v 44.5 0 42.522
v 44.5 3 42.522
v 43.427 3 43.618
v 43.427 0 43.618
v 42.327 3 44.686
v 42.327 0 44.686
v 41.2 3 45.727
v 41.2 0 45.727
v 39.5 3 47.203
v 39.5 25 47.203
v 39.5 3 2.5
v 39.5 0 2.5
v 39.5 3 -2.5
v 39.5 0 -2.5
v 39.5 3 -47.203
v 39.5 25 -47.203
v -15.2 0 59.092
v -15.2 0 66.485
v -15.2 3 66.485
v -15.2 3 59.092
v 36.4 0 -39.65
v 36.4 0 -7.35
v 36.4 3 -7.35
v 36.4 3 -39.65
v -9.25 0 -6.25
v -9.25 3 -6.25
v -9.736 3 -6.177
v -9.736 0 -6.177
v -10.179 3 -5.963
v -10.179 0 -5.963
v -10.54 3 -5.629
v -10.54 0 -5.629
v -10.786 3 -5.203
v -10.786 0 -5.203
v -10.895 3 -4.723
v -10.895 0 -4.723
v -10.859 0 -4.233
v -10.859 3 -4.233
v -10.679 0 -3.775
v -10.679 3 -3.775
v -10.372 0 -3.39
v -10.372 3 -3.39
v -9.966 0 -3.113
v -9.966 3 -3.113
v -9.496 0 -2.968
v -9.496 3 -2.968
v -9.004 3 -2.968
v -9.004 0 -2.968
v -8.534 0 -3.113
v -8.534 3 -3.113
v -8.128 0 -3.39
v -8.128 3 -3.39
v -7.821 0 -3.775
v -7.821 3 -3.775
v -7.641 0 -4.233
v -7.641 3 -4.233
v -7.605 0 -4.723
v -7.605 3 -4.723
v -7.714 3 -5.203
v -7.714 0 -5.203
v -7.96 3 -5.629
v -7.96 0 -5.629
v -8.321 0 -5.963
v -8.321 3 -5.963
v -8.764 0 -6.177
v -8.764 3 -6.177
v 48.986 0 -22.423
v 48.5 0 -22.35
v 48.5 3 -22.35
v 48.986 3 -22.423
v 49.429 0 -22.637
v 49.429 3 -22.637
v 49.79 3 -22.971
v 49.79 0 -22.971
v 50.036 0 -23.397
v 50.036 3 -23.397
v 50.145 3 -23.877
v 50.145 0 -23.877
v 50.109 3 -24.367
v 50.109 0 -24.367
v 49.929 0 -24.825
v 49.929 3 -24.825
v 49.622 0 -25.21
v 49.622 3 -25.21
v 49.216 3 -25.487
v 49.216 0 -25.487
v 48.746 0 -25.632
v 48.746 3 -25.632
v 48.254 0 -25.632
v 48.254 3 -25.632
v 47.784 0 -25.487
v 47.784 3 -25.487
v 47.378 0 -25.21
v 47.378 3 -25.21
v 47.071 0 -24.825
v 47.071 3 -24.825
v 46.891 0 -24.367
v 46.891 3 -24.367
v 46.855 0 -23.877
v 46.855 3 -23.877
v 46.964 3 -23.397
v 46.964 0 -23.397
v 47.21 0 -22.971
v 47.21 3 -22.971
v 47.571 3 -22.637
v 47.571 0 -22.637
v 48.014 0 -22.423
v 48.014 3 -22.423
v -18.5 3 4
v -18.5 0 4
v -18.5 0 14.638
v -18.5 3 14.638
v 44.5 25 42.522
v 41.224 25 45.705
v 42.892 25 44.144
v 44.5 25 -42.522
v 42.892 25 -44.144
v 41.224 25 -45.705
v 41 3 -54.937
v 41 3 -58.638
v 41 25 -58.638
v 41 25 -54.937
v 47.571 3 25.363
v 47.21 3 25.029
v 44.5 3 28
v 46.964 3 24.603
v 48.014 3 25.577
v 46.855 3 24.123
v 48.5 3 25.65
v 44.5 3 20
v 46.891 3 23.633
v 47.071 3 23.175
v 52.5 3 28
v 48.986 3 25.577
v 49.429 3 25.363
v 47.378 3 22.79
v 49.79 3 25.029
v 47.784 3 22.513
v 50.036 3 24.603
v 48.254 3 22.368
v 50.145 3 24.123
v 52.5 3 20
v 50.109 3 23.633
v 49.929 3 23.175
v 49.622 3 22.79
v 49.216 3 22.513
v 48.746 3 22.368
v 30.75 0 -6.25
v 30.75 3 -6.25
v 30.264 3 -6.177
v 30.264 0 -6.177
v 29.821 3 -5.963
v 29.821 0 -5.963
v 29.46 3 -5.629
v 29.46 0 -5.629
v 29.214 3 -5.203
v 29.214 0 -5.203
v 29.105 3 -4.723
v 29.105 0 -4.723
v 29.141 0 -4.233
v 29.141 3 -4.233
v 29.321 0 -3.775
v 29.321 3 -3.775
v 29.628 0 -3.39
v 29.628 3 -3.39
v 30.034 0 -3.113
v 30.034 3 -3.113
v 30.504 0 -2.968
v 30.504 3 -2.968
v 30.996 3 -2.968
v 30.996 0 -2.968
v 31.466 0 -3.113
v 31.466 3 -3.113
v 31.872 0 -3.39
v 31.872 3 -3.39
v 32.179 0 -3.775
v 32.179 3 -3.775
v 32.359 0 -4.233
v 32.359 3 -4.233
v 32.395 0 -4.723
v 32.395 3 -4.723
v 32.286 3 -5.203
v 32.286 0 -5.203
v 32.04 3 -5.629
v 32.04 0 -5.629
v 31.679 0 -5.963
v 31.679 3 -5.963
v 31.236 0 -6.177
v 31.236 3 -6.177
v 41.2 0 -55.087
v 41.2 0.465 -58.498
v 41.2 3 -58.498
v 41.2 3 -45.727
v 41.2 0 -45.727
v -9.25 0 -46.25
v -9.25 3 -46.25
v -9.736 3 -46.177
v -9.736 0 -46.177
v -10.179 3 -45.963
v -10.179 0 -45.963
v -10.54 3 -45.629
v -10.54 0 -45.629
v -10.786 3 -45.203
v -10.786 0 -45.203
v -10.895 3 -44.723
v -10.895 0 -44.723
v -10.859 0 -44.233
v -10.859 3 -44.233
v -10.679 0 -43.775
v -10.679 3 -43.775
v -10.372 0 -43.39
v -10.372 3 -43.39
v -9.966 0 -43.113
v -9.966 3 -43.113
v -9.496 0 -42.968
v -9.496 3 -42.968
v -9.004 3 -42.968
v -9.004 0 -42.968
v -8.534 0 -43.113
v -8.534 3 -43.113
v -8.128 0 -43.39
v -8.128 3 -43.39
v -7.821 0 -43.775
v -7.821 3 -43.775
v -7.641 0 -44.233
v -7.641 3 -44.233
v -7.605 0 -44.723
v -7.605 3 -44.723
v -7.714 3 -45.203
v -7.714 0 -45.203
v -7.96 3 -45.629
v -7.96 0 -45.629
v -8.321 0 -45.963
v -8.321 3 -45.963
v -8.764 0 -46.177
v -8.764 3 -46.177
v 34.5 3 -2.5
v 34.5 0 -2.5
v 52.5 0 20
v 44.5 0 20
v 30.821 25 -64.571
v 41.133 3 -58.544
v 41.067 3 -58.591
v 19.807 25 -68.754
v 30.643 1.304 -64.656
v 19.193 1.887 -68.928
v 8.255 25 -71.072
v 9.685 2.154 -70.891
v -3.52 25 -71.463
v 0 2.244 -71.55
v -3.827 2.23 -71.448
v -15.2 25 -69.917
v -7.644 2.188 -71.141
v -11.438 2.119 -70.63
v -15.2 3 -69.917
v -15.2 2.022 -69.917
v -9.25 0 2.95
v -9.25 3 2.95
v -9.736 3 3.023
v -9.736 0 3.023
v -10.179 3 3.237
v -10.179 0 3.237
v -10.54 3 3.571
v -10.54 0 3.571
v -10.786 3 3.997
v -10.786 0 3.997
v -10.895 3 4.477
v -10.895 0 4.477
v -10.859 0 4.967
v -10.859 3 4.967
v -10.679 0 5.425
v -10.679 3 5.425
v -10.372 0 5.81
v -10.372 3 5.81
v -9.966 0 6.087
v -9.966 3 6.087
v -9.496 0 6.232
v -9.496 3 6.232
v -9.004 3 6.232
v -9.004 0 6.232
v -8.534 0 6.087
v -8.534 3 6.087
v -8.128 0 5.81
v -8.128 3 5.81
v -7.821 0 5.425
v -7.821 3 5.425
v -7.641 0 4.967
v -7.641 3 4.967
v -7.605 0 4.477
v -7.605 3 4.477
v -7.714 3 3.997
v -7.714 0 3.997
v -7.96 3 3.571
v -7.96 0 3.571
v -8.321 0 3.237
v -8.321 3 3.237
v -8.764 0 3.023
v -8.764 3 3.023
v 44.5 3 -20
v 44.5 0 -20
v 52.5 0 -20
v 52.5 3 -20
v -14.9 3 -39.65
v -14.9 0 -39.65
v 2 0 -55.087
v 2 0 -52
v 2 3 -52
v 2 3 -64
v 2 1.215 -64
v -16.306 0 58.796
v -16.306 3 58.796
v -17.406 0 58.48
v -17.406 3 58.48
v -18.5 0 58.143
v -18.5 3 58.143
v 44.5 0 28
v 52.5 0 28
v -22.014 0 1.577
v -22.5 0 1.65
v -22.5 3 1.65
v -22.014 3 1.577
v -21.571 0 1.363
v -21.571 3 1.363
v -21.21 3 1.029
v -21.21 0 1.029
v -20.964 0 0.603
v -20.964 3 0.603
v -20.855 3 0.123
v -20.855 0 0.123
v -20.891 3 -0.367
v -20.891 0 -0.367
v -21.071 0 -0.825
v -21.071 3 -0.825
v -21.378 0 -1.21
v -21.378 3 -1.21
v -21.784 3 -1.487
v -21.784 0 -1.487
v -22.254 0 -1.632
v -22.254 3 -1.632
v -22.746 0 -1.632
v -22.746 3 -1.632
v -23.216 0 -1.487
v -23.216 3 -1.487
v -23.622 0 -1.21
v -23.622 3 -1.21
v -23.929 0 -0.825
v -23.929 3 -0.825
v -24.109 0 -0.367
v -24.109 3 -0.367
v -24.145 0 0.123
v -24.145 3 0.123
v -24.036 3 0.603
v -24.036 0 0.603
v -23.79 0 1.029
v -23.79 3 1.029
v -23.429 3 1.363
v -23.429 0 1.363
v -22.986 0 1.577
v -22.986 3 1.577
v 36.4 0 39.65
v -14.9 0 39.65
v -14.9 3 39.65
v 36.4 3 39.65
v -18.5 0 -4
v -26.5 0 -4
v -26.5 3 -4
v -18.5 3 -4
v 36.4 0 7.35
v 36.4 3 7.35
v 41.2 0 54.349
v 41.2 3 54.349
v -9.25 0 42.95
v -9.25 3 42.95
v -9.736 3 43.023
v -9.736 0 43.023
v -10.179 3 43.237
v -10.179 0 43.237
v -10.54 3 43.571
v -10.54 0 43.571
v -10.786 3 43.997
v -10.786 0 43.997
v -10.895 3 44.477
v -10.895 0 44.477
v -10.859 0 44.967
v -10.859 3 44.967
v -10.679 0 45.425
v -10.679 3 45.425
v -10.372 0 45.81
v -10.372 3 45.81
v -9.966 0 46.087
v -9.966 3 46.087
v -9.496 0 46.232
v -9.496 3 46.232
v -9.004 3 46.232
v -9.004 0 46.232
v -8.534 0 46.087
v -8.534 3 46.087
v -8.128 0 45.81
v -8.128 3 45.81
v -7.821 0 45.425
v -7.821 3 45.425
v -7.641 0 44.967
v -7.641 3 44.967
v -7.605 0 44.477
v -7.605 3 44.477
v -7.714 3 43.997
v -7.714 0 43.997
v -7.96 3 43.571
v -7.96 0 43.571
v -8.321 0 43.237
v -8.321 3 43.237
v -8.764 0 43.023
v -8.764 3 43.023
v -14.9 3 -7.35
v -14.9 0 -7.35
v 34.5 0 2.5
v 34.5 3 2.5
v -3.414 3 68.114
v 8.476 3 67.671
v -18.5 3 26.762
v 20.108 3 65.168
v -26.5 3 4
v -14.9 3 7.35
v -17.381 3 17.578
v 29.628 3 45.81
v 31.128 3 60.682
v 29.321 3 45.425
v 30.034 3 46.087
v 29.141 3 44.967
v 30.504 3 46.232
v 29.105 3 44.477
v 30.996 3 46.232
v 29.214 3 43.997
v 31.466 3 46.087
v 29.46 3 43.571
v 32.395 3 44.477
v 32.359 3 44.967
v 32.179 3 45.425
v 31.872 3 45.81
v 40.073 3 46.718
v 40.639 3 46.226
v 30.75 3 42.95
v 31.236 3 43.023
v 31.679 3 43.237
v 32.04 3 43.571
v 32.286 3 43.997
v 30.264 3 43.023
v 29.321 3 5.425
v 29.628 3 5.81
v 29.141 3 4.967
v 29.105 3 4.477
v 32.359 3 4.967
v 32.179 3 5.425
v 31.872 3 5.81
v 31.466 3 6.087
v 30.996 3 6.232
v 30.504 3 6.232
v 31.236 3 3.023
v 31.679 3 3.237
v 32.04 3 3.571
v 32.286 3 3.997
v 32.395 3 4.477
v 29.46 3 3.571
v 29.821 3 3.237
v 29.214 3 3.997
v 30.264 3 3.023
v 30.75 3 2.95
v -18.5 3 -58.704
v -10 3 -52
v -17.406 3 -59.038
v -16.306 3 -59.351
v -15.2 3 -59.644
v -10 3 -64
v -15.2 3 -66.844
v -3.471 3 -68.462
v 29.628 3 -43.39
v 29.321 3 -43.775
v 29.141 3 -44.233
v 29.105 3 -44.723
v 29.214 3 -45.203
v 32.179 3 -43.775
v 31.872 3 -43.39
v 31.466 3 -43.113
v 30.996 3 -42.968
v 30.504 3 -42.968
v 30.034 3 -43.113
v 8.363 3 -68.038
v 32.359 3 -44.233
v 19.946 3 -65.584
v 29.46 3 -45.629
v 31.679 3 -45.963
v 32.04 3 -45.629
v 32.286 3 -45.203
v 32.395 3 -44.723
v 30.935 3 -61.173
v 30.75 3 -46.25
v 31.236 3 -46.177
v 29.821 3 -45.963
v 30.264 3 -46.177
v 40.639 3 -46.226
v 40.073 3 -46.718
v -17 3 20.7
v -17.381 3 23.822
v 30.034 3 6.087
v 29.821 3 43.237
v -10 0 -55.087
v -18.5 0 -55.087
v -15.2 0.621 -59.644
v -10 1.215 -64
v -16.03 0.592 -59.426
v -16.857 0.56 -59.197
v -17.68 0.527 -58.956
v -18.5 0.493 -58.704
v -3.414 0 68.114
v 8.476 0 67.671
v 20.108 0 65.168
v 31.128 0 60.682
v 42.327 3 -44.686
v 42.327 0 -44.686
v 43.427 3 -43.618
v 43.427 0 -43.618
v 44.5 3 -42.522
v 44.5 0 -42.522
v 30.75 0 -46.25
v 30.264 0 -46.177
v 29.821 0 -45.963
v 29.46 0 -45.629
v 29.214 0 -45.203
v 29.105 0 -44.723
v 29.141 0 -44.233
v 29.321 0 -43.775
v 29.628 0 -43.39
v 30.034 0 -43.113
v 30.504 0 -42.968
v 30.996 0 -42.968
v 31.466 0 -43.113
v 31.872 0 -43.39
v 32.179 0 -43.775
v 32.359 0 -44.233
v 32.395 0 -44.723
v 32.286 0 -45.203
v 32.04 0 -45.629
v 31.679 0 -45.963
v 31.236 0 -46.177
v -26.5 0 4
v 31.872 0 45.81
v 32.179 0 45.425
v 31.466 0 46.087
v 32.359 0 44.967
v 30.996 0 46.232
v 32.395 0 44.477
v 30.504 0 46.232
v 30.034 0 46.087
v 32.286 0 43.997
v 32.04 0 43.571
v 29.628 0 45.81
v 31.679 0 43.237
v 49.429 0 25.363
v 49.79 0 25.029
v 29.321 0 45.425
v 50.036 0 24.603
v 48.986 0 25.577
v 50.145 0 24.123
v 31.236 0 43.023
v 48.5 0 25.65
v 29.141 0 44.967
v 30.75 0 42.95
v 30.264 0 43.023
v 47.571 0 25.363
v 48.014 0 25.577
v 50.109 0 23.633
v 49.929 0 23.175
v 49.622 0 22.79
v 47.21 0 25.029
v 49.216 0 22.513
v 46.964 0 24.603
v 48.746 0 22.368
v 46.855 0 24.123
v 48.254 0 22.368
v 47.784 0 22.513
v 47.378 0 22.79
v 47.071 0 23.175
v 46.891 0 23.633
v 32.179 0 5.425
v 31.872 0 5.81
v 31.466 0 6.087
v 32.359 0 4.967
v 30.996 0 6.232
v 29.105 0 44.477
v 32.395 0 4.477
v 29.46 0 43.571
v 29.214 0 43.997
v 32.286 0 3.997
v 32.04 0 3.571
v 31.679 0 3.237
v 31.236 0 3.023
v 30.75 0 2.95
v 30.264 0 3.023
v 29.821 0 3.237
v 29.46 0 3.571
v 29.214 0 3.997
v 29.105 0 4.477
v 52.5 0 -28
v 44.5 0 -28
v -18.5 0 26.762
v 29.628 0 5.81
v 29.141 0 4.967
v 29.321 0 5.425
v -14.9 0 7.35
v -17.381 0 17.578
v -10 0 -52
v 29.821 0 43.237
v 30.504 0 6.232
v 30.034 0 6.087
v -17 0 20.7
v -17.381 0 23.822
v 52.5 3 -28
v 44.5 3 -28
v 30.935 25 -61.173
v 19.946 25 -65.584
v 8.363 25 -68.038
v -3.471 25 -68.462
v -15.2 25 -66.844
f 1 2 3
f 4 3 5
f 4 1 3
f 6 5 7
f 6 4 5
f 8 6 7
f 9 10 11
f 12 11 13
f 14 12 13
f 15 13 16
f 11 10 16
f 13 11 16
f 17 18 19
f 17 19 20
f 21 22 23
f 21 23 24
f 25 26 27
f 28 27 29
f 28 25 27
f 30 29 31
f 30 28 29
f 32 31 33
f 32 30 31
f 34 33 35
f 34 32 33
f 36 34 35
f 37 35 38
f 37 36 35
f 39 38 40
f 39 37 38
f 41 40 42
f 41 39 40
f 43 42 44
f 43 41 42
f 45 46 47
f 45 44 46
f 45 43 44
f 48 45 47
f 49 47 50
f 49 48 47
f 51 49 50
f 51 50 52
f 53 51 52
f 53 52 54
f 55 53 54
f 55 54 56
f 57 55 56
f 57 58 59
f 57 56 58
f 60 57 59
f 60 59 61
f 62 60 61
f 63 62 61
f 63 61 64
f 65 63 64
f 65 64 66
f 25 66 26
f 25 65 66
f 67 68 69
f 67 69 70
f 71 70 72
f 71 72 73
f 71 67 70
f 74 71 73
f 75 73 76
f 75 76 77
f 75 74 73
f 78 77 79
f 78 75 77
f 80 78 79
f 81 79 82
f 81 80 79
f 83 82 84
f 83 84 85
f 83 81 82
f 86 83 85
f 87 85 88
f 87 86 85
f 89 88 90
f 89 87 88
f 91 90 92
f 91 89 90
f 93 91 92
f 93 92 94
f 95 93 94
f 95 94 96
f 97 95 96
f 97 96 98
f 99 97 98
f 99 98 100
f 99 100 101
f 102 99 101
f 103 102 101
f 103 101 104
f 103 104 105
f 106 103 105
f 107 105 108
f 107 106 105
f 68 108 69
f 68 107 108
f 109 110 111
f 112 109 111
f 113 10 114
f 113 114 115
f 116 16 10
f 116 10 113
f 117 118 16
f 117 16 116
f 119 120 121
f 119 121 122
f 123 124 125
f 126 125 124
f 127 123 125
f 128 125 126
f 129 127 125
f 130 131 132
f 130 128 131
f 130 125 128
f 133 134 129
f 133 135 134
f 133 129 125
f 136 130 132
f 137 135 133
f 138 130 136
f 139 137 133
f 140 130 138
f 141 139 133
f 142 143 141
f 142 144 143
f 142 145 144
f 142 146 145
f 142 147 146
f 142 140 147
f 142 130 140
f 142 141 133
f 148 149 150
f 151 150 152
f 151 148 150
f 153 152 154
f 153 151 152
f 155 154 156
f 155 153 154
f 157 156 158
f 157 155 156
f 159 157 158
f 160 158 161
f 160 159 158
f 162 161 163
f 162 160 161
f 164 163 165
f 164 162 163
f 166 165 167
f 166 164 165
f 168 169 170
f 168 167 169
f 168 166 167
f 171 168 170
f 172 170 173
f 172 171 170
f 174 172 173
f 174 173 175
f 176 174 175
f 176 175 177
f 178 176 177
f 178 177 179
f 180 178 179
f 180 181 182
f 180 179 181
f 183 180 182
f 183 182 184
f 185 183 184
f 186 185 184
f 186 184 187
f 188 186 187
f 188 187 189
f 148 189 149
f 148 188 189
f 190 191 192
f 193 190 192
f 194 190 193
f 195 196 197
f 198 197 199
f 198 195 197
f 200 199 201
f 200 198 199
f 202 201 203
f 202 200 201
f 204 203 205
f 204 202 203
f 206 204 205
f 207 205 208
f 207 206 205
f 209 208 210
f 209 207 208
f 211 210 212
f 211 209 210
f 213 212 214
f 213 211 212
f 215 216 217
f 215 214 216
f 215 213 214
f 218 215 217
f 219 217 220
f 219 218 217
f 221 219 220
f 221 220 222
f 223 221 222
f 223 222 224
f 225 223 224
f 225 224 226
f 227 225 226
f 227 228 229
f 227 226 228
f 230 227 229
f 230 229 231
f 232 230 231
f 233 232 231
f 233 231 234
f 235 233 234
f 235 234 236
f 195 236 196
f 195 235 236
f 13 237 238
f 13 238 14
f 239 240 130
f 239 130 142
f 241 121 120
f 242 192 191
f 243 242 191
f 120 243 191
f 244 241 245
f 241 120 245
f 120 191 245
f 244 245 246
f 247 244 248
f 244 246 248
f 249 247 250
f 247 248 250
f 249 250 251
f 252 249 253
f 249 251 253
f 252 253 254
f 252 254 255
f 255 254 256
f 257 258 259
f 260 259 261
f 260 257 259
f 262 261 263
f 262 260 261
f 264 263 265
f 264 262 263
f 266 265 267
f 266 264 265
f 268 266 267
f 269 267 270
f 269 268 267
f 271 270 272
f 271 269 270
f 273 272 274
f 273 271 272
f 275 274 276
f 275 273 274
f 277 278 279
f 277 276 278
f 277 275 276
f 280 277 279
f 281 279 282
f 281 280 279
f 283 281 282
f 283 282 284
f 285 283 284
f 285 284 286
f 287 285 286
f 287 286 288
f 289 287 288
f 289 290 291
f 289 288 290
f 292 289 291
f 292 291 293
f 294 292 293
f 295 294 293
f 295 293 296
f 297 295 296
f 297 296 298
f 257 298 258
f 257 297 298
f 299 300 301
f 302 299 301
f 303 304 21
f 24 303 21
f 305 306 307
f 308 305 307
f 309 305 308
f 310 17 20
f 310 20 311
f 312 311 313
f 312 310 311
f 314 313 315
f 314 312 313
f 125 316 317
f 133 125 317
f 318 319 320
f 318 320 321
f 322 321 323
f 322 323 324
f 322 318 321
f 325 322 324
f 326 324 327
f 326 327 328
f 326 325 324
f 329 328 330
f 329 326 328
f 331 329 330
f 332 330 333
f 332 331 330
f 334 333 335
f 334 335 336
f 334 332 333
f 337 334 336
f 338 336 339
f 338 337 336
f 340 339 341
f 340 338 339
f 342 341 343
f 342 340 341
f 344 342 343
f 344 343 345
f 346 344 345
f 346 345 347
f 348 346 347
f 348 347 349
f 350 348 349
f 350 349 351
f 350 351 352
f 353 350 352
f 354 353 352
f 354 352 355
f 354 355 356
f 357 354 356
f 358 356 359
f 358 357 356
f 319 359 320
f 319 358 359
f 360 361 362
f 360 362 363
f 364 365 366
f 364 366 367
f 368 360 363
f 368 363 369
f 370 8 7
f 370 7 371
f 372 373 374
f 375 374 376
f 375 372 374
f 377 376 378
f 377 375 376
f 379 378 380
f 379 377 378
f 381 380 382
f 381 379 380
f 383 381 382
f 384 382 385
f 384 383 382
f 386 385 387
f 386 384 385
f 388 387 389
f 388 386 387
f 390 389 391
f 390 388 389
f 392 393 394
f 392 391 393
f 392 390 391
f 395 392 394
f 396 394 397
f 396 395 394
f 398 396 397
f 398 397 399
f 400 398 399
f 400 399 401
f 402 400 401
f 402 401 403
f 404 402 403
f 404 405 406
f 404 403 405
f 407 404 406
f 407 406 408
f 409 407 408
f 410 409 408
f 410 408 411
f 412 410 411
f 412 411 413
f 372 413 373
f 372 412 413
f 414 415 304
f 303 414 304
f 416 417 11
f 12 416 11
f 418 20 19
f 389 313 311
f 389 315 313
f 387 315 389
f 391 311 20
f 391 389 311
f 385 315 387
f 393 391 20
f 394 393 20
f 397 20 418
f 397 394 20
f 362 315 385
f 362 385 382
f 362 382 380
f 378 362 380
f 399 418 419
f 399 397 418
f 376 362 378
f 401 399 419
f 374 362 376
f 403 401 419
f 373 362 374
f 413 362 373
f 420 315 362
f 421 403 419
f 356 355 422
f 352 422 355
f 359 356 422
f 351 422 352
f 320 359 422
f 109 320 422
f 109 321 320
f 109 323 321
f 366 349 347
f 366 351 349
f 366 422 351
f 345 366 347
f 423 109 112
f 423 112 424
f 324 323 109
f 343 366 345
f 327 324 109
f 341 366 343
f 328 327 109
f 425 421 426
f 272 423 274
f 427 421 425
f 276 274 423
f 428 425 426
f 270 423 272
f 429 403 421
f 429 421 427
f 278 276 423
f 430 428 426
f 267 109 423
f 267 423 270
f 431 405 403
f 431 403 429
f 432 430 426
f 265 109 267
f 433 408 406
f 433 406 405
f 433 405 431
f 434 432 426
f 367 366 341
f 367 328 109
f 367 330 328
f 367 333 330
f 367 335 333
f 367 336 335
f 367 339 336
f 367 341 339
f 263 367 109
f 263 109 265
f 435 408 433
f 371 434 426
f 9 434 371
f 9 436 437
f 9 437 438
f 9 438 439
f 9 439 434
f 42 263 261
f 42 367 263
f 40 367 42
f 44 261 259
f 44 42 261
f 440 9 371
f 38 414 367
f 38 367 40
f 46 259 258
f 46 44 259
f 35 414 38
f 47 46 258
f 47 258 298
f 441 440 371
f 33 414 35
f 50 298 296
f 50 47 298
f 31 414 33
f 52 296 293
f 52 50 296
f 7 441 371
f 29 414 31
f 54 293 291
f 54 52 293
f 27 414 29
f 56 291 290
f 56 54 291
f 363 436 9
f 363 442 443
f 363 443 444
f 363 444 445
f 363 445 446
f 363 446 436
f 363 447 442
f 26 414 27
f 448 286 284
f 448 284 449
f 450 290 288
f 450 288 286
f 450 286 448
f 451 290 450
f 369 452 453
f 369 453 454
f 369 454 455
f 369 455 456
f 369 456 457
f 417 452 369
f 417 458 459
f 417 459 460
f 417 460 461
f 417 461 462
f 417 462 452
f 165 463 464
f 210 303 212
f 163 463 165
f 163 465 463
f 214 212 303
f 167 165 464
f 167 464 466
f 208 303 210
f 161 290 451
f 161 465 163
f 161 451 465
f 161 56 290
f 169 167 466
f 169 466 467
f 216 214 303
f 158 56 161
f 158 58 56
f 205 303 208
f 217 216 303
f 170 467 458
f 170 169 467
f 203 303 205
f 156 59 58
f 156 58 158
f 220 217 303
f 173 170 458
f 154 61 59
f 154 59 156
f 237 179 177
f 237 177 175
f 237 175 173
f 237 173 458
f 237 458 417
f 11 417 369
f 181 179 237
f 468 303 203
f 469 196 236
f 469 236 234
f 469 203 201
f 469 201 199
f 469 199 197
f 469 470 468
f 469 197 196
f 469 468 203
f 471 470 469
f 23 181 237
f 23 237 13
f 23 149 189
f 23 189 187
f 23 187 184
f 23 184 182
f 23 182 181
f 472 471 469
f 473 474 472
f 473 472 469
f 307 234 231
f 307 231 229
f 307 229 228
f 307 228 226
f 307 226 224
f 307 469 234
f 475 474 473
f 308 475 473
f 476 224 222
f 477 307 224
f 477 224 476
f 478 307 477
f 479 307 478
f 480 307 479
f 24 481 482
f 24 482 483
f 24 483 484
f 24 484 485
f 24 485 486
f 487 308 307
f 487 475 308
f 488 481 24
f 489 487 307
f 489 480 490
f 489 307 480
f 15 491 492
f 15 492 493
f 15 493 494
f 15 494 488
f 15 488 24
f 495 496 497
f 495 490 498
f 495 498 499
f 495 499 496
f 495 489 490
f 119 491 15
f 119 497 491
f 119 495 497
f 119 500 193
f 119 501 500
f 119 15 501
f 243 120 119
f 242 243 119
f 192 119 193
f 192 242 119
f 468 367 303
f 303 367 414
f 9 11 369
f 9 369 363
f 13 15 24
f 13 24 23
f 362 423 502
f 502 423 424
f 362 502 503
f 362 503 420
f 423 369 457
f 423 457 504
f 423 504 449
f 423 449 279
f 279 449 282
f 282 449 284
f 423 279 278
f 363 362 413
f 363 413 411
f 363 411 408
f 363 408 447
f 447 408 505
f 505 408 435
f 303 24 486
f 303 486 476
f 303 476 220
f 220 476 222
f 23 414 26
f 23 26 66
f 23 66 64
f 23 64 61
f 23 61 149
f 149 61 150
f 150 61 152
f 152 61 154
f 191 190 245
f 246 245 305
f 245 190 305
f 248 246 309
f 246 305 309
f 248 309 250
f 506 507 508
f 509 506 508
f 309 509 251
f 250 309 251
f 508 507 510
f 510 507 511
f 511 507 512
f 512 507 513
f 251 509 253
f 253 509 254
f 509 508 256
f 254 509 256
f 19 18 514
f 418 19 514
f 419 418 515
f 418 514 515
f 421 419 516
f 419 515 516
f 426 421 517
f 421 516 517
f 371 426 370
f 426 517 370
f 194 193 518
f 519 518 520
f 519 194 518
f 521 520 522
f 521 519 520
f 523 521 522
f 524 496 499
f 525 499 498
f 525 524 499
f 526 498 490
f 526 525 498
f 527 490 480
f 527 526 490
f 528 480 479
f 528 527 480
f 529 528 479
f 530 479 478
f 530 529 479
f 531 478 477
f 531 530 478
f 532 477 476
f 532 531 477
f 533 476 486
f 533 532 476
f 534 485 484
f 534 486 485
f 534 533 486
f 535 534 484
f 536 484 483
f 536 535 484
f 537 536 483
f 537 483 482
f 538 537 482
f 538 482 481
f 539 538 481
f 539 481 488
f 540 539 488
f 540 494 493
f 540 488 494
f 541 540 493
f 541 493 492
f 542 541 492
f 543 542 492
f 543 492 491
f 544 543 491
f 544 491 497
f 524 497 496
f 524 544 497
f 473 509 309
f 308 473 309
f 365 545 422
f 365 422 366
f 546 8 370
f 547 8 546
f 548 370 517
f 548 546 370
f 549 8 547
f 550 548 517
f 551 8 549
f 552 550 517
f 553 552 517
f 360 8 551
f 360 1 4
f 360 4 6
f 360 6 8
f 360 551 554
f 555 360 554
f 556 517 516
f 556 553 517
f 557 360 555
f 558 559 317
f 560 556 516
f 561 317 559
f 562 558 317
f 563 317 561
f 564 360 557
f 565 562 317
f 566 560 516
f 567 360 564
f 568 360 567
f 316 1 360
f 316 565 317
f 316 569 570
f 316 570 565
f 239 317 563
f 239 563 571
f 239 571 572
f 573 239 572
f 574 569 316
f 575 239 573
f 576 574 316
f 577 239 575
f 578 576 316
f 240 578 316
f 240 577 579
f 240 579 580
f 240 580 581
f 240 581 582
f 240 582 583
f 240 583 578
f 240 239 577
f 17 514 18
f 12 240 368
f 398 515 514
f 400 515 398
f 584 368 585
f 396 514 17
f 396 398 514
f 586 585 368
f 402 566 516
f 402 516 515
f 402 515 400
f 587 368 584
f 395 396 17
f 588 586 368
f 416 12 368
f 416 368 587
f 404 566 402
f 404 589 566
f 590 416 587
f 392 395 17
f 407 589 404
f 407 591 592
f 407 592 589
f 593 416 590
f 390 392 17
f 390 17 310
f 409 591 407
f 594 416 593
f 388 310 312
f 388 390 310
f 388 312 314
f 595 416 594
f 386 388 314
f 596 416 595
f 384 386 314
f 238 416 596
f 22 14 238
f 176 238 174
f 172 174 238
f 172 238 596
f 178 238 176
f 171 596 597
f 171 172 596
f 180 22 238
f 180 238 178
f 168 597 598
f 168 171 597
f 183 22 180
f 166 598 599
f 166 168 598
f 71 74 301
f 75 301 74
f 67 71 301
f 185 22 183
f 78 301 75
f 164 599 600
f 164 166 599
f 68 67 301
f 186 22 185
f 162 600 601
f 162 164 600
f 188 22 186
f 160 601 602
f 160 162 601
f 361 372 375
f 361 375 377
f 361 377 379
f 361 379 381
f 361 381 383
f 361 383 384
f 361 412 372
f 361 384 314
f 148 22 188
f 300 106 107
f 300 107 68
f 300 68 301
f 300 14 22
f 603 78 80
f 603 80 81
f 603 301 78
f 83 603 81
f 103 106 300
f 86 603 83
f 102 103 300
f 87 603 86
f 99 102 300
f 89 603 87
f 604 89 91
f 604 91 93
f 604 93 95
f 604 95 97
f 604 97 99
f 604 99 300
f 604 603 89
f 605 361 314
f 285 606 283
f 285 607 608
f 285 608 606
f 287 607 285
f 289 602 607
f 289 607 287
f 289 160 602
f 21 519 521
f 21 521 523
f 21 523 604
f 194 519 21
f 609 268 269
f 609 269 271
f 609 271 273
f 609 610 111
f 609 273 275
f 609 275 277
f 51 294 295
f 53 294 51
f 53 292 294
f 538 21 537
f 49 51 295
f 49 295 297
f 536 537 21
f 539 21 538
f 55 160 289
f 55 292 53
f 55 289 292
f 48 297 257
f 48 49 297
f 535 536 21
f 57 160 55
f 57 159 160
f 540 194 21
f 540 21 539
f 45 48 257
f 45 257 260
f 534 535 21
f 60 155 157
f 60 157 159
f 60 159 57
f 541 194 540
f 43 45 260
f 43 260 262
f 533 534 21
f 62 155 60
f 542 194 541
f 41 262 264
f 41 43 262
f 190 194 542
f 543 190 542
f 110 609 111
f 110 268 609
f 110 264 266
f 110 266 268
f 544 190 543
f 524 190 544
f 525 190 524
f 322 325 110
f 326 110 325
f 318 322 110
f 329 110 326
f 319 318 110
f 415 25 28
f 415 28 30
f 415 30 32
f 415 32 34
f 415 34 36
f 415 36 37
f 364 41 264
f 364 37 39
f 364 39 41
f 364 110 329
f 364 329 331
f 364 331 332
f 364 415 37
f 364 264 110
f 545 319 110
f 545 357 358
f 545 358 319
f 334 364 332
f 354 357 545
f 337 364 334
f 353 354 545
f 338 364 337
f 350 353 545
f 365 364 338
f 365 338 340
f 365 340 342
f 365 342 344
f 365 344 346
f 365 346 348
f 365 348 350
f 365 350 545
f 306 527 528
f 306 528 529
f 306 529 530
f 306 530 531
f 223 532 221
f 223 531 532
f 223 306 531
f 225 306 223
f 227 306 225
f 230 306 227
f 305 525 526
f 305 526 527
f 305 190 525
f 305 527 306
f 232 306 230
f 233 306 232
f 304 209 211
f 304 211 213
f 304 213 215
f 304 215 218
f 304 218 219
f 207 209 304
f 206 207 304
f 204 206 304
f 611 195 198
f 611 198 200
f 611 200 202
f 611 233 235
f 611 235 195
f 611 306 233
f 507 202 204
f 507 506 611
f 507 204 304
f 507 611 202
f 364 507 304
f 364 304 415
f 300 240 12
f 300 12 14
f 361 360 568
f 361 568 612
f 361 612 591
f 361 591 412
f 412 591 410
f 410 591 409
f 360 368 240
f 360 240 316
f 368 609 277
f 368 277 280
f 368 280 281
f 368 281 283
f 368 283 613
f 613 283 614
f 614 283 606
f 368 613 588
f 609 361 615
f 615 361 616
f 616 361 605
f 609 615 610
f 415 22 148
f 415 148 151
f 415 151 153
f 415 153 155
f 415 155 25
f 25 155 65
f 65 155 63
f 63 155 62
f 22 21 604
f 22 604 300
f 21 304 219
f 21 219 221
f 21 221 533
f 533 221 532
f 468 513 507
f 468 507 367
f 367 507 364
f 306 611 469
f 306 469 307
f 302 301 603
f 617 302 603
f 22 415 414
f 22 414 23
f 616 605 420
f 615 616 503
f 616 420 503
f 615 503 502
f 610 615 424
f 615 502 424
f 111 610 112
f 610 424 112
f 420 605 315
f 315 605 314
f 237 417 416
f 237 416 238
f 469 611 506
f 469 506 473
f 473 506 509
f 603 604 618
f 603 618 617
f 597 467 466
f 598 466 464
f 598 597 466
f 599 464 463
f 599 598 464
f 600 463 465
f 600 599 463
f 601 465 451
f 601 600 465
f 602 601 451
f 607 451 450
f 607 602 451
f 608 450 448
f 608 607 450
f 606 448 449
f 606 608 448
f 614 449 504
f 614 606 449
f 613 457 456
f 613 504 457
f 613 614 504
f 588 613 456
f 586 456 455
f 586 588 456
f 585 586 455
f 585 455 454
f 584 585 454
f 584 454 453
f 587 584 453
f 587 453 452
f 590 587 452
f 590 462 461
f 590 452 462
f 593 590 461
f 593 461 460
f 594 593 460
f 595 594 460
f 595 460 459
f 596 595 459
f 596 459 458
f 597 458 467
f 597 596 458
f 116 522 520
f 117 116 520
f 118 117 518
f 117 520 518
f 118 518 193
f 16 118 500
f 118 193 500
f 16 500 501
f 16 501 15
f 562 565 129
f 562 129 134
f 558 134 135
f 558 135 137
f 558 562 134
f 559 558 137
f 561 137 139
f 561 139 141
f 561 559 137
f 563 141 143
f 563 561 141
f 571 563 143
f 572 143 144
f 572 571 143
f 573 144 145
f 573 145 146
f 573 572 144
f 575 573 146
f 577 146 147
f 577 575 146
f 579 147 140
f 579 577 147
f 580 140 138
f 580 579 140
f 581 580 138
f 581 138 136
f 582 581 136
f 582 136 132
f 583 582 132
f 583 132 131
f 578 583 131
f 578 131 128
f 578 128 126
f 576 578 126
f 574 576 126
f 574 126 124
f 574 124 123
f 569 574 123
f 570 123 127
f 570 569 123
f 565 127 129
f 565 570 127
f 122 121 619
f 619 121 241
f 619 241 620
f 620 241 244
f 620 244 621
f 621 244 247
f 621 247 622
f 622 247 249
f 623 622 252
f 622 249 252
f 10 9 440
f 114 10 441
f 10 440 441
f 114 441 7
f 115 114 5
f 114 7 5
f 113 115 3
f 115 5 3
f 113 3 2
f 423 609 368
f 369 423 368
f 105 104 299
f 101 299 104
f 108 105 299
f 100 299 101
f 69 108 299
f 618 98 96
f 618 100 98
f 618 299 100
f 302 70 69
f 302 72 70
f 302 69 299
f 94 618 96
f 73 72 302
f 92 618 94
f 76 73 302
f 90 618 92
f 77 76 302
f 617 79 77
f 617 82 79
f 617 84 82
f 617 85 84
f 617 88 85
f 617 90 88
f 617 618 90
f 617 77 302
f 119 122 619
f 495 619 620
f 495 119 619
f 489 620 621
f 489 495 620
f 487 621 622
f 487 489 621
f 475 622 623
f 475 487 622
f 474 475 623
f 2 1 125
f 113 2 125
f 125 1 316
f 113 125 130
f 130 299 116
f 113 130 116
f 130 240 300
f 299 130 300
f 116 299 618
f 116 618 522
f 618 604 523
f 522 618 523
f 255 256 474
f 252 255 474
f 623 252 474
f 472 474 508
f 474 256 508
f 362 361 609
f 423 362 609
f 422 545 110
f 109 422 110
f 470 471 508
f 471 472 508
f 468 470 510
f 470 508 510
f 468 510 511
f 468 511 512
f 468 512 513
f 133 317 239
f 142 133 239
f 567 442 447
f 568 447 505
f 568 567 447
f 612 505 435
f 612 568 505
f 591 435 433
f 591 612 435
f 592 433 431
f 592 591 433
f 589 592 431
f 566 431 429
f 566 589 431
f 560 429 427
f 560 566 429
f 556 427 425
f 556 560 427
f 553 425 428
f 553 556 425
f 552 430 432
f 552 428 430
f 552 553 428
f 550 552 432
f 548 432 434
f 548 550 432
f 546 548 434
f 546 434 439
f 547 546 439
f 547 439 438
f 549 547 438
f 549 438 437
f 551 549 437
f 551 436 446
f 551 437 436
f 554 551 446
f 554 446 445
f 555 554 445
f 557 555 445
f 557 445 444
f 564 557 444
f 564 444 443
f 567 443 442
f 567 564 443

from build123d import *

# Parameters (mm, degrees)
SKETCH1_W               = 8
SKETCH1_H               = 8
SKETCH1_R               = 1.65
BOSS_EXTRUDE1_DEPTH     = 3
BOSS_EXTRUDE2_DEPTH     = 22
SKETCH3_R               = 13
CUT_EXTRUDE1_DEPTH      = 92.431135288
CUT_EXTRUDE3_DEPTH      = 3
SKETCH6_R               = 1.65
SKETCH6_W               = 51.3
SKETCH6_H               = 32.3
CUT_EXTRUDE4_DEPTH      = 93.198983183
BOSS_EXTRUDE4_DEPTH     = 25
CUT_EXTRUDE5_DEPTH      = 93.198983183
SKETCH10_W              = 12
SKETCH10_H              = 12
CUT_EXTRUDE6_DEPTH      = 93.198983183
SKETCH11_W              = 5
SKETCH11_H              = 5
CUT_EXTRUDE7_DEPTH      = 10
CUT_EXTRUDE8_DEPTH      = 93.198983183
CUT_EXTRUDE8_DEPTH_BACK = 93.198983183


# Read off the part's stored shape, not the designer's step: Cut-Extrude3
with BuildPart() as part:
    # Sketch1 → Boss-Extrude1 (new body)
    # profile 1 of 4: a face of its own
    with BuildSketch(Plane(origin=(0, 0, 0), x_dir=(1, 0, 0), z_dir=(0, 1, 0))):
        with BuildLine():
            Line((-18.5, 69.116947994), (-18.5, 4))
            Line((-18.5, 4), (-18.5, -4))
            Line((-18.5, -4), (-18.5, -65.642897559))
            ThreePointArc((-18.5, -65.642897559), (14.755653403, -66.584613032), (44.5, -51.681621492))
            Line((44.5, -51.681621492), (44.5, -28))
            Line((44.5, -28), (44.5, -20))
            Line((44.5, -20), (44.5, 20))
            Line((44.5, 20), (44.5, 28))
            Line((44.5, 28), (44.5, 55))
            Line((44.5, 55), (44.5, 56.028140251))
            ThreePointArc((44.5, 56.028140251), (14.554354058, 70.054073957), (-18.5, 69.116947994))
        make_face()
    # profile 2 of 4: a face of its own
    with BuildSketch(Plane(origin=(0, 0, 0), x_dir=(1, 0, 0), z_dir=(0, 1, 0))):
        with Locations((-22.5, 0)):
            Rectangle(SKETCH1_W, SKETCH1_H)
        with Locations(Location((-22.5, 0, 0), (0, 0, 270))):
            Circle(SKETCH1_R, mode=Mode.SUBTRACT)
    # profile 3 of 4: a face of its own
    with BuildSketch(Plane(origin=(0, 0, 0), x_dir=(1, 0, 0), z_dir=(0, 1, 0))):
        with Locations((48.5, -24)):
            Rectangle(SKETCH1_W, SKETCH1_H)
        with Locations(Location((48.5, -24, 0), (0, 0, 270))):
            Circle(SKETCH1_R, mode=Mode.SUBTRACT)
    # profile 4 of 4: a face of its own
    with BuildSketch(Plane(origin=(0, 0, 0), x_dir=(1, 0, 0), z_dir=(0, 1, 0))):
        with Locations((48.5, 24)):
            Rectangle(SKETCH1_W, SKETCH1_H)
        with Locations(Location((48.5, 24, 0), (0, 0, 270))):
            Circle(SKETCH1_R, mode=Mode.SUBTRACT)
    extrude(amount=BOSS_EXTRUDE1_DEPTH)

    # Sketch2 → Boss-Extrude2 (add)
    with BuildSketch(Plane(origin=(0, 3, 0), x_dir=(1, 0, 0), z_dir=(0, 1, 0))):
        with BuildLine():
            Line((44.5, -42.522376462), (44.5, 42.522376462))
            ThreePointArc((44.5, 42.522376462), (42.065161183, 44.932446124), (39.5, 47.203310265))
            Line((39.5, 47.203310265), (39.5, -47.203310265))
            ThreePointArc((39.5, -47.203310265), (42.065161183, -44.932446124), (44.5, -42.522376462))
        make_face()
    extrude(amount=BOSS_EXTRUDE2_DEPTH)

    # Sketch3 → Cut-Extrude1 (cut, through all)
    with BuildSketch(Plane(origin=(0, 3, 0), x_dir=(1, 0, 0), z_dir=(0, 1, 0))):
        with Locations((-30, -20.7)):
            Circle(SKETCH3_R)
    extrude(amount=-CUT_EXTRUDE1_DEPTH, mode=Mode.SUBTRACT)

    # Cut-Extrude3 outline → Cut-Extrude3 (cut)
    with BuildSketch(Plane(origin=(0, 0, 0), x_dir=(1, 0, 0), z_dir=(0, 1, 0))):
        with BuildLine():
            Line((44.5, -51.681621492), (44.5, -42.522376462))
            ThreePointArc((44.5, -42.522376462), (42.879948374, -44.155549226), (41.2, -45.727043421))
            Line((41.2, -45.727043421), (41.2, -54.348873033))
            ThreePointArc((41.2, -54.348873033), (42.870748276, -53.040917623), (44.5, -51.681621492))
        make_face()
        with BuildLine():
            ThreePointArc((41.2, 45.727043421), (42.879948374, 44.155549226), (44.5, 42.522376462))
            Line((44.5, 42.522376462), (44.5, 56.028140251))
            ThreePointArc((44.5, 56.028140251), (42.867784957, 57.286608495), (41.2, 58.497542683))
            Line((41.2, 58.497542683), (41.2, 45.727043421))
        make_face()
        with BuildLine():
            ThreePointArc((-18.5, -65.642897559), (-16.85525465, -66.084343007), (-15.2, -66.484584679))
            Line((-15.2, -66.484584679), (-15.2, -59.091509852))
            ThreePointArc((-15.2, -59.091509852), (-16.856674237, -58.640421812), (-18.5, -58.142897559))
            Line((-18.5, -58.142897559), (-18.5, -65.642897559))
        make_face()
    extrude(amount=CUT_EXTRUDE3_DEPTH, mode=Mode.SUBTRACT)

    # Sketch6 → Cut-Extrude4 (cut, through all)
    with BuildSketch(Plane(origin=(0, 0, 0), x_dir=(1, 0, 0), z_dir=(0, 1, 0))):
        with Locations(Location((-9.25, 44.6, 0), (0, 0, 90))):
            Circle(SKETCH6_R)
        with Locations(Location((-9.25, 4.6, 0), (0, 0, 90))):
            Circle(SKETCH6_R)
        with Locations(Location((30.75, 4.6, 0), (0, 0, 90))):
            Circle(SKETCH6_R)
        with Locations(Location((30.75, 44.6, 0), (0, 0, 90))):
            Circle(SKETCH6_R)
        with Locations(Location((-9.25, -4.6, 0), (0, 0, 90))):
            Circle(SKETCH6_R)
        with Locations(Location((30.75, -4.6, 0), (0, 0, 90))):
            Circle(SKETCH6_R)
        with Locations(Location((30.75, -44.6, 0), (0, 0, 90))):
            Circle(SKETCH6_R)
        with Locations(Location((-9.25, -44.6, 0), (0, 0, 90))):
            Circle(SKETCH6_R)
        with Locations((10.75, 23.5)):
            Rectangle(SKETCH6_W, SKETCH6_H)
        with Locations((10.75, -23.5)):
            Rectangle(SKETCH6_W, SKETCH6_H)
    extrude(amount=CUT_EXTRUDE4_DEPTH, mode=Mode.SUBTRACT)

    # Sketch8 → Boss-Extrude4 (add)
    with BuildSketch(Plane(origin=(0, 0, 0), x_dir=(1, 0, 0), z_dir=(0, 1, 0))):
        with BuildLine():
            Line((41, 58.637893039), (41, 54.93725967))
            ThreePointArc((41, 54.93725967), (14.207393879, 67.061557238), (-15.2, 66.843567379))
            Line((-15.2, 66.843567379), (-15.2, 69.916825586))
            ThreePointArc((-15.2, 69.916825586), (14.078834464, 70.151186164), (41, 58.637893039))
        make_face()
    extrude(amount=BOSS_EXTRUDE4_DEPTH)

    # Sketch9 → Cut-Extrude5 (cut, through all)
    with BuildSketch(Plane(origin=(0, 0, 0), x_dir=(1, 0, 0), z_dir=(0, 1, 0))):
        with BuildLine():
            Line((-18.5, 58.703939391), (-18.5, 74.933190401))
            Line((-18.5, 74.933190401), (-15.2, 74.933190401))
            Line((-15.2, 74.933190401), (-15.2, 59.643629165))
            ThreePointArc((-15.2, 59.643629165), (-16.856549297, 59.196784083), (-18.5, 58.703939391))
        make_face()
    extrude(amount=CUT_EXTRUDE5_DEPTH, mode=Mode.SUBTRACT)

    # Sketch10 → Cut-Extrude6 (cut, through all)
    with BuildSketch(Plane(origin=(0, 0, 0), x_dir=(1, 0, 0), z_dir=(0, 1, 0))):
        with Locations((-4, 58)):
            Rectangle(SKETCH10_W, SKETCH10_H)
    extrude(amount=CUT_EXTRUDE6_DEPTH, mode=Mode.SUBTRACT)

    # Sketch11 → Cut-Extrude7 (cut)
    with BuildSketch(Plane(origin=(0, 3, 0), x_dir=(1, 0, 0), z_dir=(0, 1, 0))):
        with Locations((37, 0)):
            Rectangle(SKETCH11_W, SKETCH11_H)
    extrude(amount=-CUT_EXTRUDE7_DEPTH, mode=Mode.SUBTRACT)

    # Sketch13 → Cut-Extrude8 (cut, two sides: drawn at the far end of the back side and taken through both)
    with BuildSketch(Plane(origin=(0, 0, 0), x_dir=(0, 0, -1), z_dir=(1, 0, 0)).offset(-CUT_EXTRUDE8_DEPTH_BACK)):
        Polygon((55.086575096, 0), (71.55, 2.244157451), (71.55, 0), align=None)
    extrude(amount=CUT_EXTRUDE8_DEPTH + CUT_EXTRUDE8_DEPTH_BACK, mode=Mode.SUBTRACT)


solid = part.part
